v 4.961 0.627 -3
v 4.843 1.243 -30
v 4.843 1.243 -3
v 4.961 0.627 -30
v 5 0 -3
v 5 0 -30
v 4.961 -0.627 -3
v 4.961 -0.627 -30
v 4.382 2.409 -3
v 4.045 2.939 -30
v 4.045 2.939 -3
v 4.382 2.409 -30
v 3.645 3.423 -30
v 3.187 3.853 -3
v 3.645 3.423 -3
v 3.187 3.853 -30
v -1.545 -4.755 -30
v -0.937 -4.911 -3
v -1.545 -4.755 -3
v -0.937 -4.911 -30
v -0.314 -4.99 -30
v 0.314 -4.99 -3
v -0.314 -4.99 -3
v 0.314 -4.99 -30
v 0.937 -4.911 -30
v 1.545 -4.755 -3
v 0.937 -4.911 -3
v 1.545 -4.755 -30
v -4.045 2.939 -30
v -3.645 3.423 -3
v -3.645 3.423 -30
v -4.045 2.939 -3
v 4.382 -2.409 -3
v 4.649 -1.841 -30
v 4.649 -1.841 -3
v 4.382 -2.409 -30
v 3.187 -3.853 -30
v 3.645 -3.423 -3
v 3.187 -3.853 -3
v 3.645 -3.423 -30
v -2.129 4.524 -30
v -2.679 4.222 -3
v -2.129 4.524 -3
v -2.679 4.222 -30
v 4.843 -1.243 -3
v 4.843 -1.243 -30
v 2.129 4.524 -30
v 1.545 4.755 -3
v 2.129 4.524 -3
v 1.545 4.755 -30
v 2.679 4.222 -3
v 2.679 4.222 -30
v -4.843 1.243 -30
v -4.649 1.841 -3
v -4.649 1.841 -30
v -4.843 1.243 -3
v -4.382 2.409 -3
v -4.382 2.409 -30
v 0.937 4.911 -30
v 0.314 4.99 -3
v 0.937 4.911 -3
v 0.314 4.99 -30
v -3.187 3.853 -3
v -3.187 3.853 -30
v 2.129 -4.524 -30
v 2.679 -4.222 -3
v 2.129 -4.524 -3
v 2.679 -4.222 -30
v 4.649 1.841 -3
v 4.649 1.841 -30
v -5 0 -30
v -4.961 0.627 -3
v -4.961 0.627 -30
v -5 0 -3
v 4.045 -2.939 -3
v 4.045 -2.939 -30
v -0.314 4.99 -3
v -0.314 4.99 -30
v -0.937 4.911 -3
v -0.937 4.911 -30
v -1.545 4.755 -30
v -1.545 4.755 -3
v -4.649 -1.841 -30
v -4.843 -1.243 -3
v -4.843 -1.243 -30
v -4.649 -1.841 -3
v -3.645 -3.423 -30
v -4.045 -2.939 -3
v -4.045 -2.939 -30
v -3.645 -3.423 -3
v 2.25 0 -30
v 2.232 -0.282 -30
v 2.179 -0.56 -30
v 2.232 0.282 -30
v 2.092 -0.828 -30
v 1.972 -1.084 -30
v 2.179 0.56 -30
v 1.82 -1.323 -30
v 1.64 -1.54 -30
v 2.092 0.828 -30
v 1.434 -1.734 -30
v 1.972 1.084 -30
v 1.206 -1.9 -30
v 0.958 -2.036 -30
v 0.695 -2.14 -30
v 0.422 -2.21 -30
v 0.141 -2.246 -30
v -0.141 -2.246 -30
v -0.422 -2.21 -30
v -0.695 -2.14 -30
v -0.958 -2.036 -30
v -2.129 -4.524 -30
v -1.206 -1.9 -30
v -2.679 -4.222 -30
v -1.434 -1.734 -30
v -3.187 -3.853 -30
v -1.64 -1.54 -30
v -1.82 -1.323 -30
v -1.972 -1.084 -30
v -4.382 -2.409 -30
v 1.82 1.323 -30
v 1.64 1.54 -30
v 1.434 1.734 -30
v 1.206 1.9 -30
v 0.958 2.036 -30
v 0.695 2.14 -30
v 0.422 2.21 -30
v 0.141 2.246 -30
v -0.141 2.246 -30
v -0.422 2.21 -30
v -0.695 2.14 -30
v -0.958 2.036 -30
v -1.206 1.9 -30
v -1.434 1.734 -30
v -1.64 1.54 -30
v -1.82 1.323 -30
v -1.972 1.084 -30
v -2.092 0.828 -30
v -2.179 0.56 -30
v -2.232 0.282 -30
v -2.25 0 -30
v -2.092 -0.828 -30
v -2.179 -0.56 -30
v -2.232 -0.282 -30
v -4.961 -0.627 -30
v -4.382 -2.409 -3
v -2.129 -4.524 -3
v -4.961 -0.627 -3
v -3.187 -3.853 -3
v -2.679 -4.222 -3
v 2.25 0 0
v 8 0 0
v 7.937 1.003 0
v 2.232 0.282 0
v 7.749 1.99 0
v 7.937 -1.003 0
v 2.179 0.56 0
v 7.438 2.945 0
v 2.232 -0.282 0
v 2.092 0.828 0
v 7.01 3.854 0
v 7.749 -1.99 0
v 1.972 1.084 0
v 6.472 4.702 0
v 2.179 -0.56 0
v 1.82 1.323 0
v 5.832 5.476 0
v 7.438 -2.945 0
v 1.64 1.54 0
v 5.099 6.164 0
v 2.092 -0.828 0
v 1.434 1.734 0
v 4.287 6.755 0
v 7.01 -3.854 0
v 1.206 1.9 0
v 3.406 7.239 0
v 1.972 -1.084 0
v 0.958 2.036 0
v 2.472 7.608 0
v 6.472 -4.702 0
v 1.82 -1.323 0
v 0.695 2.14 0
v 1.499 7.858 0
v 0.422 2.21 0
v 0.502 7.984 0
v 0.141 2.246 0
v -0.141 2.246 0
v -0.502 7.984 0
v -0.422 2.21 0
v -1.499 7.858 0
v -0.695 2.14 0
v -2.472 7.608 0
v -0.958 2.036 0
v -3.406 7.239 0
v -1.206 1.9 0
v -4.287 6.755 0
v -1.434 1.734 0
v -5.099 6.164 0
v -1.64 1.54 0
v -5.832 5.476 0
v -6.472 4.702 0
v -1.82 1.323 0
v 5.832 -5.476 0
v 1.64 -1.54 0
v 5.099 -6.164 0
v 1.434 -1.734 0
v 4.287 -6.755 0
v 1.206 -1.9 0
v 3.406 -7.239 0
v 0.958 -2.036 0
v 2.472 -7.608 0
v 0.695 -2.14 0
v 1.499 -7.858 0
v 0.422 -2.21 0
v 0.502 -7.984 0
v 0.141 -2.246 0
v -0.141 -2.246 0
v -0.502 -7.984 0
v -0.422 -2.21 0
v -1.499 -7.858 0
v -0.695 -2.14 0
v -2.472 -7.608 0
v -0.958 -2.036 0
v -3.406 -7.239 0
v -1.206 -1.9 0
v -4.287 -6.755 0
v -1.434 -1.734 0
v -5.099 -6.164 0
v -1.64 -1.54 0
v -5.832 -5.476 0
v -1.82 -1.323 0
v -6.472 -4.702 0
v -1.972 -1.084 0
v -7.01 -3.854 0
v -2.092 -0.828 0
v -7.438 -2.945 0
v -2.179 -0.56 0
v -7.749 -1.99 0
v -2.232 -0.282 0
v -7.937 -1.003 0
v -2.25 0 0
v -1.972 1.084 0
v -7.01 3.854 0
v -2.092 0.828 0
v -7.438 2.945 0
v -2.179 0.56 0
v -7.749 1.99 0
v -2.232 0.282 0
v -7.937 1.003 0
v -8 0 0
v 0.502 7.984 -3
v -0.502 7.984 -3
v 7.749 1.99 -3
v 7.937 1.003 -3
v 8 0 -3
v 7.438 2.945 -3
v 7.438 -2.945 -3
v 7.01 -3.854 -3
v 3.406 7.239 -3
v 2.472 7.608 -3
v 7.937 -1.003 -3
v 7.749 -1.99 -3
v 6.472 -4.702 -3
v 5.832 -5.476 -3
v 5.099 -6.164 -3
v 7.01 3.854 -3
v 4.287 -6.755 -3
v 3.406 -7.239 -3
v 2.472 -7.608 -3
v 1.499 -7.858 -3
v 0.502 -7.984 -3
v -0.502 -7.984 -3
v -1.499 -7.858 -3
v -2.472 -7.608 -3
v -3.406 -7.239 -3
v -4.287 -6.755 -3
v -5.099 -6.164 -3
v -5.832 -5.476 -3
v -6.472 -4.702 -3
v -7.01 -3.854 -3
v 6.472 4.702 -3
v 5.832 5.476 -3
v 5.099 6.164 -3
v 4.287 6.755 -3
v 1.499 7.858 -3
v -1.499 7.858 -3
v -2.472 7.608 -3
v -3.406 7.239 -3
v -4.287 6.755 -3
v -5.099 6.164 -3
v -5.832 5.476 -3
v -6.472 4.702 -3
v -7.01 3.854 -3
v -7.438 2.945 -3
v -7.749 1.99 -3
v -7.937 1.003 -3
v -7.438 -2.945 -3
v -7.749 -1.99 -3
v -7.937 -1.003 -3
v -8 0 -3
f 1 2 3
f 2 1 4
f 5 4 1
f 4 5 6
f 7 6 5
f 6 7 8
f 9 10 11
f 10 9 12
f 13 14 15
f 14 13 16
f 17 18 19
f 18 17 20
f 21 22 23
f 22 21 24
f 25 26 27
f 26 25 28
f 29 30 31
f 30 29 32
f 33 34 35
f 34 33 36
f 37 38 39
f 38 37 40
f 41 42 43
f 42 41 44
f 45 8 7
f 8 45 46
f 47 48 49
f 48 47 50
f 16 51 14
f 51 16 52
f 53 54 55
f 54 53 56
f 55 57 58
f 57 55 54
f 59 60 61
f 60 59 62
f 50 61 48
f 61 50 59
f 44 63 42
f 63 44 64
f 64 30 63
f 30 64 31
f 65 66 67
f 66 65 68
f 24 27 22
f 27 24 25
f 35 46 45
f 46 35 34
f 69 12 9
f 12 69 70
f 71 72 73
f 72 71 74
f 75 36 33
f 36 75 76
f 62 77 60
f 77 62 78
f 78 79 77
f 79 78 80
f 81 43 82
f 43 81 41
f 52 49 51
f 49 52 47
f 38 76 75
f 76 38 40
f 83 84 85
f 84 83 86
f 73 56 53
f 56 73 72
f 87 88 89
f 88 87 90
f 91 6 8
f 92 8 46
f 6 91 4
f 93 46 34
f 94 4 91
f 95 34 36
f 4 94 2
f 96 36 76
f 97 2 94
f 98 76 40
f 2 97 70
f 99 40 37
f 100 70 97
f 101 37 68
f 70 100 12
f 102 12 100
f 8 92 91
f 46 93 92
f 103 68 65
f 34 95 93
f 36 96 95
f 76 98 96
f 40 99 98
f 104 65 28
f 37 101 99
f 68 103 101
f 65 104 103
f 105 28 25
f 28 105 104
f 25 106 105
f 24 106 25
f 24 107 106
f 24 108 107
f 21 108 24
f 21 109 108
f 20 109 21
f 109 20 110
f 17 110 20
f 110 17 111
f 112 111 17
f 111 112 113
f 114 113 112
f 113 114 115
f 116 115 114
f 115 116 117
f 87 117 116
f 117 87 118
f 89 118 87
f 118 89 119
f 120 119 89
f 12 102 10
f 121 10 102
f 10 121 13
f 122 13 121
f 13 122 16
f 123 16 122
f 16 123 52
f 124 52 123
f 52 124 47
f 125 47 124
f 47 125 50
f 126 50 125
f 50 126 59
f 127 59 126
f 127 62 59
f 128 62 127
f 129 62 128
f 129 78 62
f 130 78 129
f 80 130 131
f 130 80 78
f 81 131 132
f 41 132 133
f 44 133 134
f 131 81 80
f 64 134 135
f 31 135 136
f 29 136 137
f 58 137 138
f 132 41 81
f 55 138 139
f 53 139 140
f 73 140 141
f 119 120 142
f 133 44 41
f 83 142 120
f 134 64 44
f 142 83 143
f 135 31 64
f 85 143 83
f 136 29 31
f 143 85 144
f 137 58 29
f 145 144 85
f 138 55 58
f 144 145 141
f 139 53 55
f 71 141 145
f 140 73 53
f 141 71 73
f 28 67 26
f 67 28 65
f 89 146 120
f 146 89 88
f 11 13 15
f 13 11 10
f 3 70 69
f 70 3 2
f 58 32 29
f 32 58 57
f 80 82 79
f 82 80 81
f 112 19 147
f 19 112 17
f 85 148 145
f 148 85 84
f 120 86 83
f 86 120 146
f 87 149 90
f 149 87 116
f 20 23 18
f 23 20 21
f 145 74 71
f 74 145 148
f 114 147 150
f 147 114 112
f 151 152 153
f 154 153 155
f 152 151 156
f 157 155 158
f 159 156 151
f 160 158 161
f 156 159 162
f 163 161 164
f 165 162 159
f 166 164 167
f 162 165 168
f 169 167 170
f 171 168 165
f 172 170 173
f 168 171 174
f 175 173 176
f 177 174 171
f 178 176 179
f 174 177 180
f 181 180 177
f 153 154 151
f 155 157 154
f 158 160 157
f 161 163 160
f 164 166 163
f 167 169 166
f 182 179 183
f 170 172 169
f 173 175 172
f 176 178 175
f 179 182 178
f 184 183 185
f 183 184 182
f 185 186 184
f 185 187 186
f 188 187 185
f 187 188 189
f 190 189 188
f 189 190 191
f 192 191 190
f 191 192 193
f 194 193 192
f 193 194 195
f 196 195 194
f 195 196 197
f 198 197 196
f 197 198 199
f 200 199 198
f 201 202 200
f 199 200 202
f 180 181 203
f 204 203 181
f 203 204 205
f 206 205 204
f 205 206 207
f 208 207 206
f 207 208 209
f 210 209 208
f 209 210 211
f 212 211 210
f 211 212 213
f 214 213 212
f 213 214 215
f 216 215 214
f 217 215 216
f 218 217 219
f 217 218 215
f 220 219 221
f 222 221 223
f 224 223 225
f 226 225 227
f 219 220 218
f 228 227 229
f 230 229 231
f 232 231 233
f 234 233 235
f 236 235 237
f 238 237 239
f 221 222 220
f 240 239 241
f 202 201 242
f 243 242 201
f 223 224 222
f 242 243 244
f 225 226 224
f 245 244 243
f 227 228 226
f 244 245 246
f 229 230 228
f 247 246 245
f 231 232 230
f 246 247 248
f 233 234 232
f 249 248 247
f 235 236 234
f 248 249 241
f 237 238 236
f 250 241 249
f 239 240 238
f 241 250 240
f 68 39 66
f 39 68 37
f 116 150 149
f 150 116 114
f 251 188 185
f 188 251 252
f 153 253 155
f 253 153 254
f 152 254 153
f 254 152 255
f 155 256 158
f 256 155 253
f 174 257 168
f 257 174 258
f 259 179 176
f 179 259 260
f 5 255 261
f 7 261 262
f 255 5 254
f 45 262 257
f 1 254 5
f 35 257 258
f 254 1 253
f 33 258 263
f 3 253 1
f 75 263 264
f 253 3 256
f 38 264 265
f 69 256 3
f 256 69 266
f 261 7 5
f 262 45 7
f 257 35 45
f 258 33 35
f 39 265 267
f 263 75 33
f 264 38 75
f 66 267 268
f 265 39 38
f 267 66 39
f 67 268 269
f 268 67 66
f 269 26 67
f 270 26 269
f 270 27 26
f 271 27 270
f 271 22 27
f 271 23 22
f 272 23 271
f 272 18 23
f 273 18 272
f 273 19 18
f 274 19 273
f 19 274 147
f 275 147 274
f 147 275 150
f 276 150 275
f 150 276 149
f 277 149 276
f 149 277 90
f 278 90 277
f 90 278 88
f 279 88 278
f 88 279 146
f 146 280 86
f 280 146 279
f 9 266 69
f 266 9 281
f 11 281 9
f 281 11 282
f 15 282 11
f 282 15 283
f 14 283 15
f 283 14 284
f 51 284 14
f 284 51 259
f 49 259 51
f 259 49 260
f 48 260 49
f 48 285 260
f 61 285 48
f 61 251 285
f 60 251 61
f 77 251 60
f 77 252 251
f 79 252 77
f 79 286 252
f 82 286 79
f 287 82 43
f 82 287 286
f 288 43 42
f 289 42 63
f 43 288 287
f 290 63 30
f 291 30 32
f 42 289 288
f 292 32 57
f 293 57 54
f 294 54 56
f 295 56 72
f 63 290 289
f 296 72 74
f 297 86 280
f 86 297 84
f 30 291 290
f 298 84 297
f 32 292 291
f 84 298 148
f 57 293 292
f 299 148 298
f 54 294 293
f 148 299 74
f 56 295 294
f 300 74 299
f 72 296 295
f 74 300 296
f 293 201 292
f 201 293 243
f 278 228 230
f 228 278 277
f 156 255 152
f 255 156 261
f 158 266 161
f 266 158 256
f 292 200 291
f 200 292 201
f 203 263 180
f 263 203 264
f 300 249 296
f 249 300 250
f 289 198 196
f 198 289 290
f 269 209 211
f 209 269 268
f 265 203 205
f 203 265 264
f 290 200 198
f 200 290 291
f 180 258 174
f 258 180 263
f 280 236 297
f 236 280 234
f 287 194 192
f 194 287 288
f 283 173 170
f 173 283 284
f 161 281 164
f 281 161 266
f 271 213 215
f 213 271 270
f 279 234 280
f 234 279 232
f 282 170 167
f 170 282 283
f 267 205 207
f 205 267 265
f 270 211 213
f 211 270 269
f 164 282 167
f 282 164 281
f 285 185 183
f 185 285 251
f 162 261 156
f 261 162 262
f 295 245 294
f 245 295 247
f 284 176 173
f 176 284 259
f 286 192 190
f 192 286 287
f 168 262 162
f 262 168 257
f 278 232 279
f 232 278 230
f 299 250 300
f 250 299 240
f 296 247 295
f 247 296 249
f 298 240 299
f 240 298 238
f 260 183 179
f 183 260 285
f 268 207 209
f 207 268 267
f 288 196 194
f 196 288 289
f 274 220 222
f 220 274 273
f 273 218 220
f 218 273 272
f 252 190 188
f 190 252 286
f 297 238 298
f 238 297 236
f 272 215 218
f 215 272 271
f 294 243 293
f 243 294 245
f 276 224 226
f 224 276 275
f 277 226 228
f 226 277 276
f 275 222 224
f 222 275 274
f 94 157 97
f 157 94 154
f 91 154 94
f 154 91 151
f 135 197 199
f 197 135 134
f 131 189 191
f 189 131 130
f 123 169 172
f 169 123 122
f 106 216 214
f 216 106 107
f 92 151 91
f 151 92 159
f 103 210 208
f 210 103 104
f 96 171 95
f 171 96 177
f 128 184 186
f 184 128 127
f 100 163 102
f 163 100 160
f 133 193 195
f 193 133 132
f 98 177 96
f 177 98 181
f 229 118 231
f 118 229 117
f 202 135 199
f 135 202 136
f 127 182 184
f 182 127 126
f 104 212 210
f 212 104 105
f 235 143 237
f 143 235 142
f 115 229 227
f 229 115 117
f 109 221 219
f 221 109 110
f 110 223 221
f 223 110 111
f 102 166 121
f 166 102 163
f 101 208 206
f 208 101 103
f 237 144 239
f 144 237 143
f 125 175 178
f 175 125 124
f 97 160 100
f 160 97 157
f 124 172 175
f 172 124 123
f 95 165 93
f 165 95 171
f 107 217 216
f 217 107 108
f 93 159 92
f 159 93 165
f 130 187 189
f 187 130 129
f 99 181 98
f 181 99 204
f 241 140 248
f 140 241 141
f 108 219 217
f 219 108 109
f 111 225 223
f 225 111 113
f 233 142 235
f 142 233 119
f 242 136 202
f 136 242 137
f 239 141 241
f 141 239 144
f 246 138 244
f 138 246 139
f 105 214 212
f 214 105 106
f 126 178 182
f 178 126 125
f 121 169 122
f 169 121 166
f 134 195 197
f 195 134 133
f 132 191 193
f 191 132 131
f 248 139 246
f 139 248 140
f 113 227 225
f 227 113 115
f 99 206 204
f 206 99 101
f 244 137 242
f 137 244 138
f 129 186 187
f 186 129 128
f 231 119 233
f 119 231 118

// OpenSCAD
$fn = 50;


difference() {
	union() {
		translate(v = [0, 0, -30.0000000000]) {
			cylinder(h = 30, r = 5.0000000000);
		}
		translate(v = [0, 0, -3.0000000000]) {
			cylinder(h = 3, r = 8.0000000000);
		}
	}
	union() {
		#translate(v = [0, 0, -30]) {
			cylinder(h = 30, r = 2.2500000000);
		}
	}
}
